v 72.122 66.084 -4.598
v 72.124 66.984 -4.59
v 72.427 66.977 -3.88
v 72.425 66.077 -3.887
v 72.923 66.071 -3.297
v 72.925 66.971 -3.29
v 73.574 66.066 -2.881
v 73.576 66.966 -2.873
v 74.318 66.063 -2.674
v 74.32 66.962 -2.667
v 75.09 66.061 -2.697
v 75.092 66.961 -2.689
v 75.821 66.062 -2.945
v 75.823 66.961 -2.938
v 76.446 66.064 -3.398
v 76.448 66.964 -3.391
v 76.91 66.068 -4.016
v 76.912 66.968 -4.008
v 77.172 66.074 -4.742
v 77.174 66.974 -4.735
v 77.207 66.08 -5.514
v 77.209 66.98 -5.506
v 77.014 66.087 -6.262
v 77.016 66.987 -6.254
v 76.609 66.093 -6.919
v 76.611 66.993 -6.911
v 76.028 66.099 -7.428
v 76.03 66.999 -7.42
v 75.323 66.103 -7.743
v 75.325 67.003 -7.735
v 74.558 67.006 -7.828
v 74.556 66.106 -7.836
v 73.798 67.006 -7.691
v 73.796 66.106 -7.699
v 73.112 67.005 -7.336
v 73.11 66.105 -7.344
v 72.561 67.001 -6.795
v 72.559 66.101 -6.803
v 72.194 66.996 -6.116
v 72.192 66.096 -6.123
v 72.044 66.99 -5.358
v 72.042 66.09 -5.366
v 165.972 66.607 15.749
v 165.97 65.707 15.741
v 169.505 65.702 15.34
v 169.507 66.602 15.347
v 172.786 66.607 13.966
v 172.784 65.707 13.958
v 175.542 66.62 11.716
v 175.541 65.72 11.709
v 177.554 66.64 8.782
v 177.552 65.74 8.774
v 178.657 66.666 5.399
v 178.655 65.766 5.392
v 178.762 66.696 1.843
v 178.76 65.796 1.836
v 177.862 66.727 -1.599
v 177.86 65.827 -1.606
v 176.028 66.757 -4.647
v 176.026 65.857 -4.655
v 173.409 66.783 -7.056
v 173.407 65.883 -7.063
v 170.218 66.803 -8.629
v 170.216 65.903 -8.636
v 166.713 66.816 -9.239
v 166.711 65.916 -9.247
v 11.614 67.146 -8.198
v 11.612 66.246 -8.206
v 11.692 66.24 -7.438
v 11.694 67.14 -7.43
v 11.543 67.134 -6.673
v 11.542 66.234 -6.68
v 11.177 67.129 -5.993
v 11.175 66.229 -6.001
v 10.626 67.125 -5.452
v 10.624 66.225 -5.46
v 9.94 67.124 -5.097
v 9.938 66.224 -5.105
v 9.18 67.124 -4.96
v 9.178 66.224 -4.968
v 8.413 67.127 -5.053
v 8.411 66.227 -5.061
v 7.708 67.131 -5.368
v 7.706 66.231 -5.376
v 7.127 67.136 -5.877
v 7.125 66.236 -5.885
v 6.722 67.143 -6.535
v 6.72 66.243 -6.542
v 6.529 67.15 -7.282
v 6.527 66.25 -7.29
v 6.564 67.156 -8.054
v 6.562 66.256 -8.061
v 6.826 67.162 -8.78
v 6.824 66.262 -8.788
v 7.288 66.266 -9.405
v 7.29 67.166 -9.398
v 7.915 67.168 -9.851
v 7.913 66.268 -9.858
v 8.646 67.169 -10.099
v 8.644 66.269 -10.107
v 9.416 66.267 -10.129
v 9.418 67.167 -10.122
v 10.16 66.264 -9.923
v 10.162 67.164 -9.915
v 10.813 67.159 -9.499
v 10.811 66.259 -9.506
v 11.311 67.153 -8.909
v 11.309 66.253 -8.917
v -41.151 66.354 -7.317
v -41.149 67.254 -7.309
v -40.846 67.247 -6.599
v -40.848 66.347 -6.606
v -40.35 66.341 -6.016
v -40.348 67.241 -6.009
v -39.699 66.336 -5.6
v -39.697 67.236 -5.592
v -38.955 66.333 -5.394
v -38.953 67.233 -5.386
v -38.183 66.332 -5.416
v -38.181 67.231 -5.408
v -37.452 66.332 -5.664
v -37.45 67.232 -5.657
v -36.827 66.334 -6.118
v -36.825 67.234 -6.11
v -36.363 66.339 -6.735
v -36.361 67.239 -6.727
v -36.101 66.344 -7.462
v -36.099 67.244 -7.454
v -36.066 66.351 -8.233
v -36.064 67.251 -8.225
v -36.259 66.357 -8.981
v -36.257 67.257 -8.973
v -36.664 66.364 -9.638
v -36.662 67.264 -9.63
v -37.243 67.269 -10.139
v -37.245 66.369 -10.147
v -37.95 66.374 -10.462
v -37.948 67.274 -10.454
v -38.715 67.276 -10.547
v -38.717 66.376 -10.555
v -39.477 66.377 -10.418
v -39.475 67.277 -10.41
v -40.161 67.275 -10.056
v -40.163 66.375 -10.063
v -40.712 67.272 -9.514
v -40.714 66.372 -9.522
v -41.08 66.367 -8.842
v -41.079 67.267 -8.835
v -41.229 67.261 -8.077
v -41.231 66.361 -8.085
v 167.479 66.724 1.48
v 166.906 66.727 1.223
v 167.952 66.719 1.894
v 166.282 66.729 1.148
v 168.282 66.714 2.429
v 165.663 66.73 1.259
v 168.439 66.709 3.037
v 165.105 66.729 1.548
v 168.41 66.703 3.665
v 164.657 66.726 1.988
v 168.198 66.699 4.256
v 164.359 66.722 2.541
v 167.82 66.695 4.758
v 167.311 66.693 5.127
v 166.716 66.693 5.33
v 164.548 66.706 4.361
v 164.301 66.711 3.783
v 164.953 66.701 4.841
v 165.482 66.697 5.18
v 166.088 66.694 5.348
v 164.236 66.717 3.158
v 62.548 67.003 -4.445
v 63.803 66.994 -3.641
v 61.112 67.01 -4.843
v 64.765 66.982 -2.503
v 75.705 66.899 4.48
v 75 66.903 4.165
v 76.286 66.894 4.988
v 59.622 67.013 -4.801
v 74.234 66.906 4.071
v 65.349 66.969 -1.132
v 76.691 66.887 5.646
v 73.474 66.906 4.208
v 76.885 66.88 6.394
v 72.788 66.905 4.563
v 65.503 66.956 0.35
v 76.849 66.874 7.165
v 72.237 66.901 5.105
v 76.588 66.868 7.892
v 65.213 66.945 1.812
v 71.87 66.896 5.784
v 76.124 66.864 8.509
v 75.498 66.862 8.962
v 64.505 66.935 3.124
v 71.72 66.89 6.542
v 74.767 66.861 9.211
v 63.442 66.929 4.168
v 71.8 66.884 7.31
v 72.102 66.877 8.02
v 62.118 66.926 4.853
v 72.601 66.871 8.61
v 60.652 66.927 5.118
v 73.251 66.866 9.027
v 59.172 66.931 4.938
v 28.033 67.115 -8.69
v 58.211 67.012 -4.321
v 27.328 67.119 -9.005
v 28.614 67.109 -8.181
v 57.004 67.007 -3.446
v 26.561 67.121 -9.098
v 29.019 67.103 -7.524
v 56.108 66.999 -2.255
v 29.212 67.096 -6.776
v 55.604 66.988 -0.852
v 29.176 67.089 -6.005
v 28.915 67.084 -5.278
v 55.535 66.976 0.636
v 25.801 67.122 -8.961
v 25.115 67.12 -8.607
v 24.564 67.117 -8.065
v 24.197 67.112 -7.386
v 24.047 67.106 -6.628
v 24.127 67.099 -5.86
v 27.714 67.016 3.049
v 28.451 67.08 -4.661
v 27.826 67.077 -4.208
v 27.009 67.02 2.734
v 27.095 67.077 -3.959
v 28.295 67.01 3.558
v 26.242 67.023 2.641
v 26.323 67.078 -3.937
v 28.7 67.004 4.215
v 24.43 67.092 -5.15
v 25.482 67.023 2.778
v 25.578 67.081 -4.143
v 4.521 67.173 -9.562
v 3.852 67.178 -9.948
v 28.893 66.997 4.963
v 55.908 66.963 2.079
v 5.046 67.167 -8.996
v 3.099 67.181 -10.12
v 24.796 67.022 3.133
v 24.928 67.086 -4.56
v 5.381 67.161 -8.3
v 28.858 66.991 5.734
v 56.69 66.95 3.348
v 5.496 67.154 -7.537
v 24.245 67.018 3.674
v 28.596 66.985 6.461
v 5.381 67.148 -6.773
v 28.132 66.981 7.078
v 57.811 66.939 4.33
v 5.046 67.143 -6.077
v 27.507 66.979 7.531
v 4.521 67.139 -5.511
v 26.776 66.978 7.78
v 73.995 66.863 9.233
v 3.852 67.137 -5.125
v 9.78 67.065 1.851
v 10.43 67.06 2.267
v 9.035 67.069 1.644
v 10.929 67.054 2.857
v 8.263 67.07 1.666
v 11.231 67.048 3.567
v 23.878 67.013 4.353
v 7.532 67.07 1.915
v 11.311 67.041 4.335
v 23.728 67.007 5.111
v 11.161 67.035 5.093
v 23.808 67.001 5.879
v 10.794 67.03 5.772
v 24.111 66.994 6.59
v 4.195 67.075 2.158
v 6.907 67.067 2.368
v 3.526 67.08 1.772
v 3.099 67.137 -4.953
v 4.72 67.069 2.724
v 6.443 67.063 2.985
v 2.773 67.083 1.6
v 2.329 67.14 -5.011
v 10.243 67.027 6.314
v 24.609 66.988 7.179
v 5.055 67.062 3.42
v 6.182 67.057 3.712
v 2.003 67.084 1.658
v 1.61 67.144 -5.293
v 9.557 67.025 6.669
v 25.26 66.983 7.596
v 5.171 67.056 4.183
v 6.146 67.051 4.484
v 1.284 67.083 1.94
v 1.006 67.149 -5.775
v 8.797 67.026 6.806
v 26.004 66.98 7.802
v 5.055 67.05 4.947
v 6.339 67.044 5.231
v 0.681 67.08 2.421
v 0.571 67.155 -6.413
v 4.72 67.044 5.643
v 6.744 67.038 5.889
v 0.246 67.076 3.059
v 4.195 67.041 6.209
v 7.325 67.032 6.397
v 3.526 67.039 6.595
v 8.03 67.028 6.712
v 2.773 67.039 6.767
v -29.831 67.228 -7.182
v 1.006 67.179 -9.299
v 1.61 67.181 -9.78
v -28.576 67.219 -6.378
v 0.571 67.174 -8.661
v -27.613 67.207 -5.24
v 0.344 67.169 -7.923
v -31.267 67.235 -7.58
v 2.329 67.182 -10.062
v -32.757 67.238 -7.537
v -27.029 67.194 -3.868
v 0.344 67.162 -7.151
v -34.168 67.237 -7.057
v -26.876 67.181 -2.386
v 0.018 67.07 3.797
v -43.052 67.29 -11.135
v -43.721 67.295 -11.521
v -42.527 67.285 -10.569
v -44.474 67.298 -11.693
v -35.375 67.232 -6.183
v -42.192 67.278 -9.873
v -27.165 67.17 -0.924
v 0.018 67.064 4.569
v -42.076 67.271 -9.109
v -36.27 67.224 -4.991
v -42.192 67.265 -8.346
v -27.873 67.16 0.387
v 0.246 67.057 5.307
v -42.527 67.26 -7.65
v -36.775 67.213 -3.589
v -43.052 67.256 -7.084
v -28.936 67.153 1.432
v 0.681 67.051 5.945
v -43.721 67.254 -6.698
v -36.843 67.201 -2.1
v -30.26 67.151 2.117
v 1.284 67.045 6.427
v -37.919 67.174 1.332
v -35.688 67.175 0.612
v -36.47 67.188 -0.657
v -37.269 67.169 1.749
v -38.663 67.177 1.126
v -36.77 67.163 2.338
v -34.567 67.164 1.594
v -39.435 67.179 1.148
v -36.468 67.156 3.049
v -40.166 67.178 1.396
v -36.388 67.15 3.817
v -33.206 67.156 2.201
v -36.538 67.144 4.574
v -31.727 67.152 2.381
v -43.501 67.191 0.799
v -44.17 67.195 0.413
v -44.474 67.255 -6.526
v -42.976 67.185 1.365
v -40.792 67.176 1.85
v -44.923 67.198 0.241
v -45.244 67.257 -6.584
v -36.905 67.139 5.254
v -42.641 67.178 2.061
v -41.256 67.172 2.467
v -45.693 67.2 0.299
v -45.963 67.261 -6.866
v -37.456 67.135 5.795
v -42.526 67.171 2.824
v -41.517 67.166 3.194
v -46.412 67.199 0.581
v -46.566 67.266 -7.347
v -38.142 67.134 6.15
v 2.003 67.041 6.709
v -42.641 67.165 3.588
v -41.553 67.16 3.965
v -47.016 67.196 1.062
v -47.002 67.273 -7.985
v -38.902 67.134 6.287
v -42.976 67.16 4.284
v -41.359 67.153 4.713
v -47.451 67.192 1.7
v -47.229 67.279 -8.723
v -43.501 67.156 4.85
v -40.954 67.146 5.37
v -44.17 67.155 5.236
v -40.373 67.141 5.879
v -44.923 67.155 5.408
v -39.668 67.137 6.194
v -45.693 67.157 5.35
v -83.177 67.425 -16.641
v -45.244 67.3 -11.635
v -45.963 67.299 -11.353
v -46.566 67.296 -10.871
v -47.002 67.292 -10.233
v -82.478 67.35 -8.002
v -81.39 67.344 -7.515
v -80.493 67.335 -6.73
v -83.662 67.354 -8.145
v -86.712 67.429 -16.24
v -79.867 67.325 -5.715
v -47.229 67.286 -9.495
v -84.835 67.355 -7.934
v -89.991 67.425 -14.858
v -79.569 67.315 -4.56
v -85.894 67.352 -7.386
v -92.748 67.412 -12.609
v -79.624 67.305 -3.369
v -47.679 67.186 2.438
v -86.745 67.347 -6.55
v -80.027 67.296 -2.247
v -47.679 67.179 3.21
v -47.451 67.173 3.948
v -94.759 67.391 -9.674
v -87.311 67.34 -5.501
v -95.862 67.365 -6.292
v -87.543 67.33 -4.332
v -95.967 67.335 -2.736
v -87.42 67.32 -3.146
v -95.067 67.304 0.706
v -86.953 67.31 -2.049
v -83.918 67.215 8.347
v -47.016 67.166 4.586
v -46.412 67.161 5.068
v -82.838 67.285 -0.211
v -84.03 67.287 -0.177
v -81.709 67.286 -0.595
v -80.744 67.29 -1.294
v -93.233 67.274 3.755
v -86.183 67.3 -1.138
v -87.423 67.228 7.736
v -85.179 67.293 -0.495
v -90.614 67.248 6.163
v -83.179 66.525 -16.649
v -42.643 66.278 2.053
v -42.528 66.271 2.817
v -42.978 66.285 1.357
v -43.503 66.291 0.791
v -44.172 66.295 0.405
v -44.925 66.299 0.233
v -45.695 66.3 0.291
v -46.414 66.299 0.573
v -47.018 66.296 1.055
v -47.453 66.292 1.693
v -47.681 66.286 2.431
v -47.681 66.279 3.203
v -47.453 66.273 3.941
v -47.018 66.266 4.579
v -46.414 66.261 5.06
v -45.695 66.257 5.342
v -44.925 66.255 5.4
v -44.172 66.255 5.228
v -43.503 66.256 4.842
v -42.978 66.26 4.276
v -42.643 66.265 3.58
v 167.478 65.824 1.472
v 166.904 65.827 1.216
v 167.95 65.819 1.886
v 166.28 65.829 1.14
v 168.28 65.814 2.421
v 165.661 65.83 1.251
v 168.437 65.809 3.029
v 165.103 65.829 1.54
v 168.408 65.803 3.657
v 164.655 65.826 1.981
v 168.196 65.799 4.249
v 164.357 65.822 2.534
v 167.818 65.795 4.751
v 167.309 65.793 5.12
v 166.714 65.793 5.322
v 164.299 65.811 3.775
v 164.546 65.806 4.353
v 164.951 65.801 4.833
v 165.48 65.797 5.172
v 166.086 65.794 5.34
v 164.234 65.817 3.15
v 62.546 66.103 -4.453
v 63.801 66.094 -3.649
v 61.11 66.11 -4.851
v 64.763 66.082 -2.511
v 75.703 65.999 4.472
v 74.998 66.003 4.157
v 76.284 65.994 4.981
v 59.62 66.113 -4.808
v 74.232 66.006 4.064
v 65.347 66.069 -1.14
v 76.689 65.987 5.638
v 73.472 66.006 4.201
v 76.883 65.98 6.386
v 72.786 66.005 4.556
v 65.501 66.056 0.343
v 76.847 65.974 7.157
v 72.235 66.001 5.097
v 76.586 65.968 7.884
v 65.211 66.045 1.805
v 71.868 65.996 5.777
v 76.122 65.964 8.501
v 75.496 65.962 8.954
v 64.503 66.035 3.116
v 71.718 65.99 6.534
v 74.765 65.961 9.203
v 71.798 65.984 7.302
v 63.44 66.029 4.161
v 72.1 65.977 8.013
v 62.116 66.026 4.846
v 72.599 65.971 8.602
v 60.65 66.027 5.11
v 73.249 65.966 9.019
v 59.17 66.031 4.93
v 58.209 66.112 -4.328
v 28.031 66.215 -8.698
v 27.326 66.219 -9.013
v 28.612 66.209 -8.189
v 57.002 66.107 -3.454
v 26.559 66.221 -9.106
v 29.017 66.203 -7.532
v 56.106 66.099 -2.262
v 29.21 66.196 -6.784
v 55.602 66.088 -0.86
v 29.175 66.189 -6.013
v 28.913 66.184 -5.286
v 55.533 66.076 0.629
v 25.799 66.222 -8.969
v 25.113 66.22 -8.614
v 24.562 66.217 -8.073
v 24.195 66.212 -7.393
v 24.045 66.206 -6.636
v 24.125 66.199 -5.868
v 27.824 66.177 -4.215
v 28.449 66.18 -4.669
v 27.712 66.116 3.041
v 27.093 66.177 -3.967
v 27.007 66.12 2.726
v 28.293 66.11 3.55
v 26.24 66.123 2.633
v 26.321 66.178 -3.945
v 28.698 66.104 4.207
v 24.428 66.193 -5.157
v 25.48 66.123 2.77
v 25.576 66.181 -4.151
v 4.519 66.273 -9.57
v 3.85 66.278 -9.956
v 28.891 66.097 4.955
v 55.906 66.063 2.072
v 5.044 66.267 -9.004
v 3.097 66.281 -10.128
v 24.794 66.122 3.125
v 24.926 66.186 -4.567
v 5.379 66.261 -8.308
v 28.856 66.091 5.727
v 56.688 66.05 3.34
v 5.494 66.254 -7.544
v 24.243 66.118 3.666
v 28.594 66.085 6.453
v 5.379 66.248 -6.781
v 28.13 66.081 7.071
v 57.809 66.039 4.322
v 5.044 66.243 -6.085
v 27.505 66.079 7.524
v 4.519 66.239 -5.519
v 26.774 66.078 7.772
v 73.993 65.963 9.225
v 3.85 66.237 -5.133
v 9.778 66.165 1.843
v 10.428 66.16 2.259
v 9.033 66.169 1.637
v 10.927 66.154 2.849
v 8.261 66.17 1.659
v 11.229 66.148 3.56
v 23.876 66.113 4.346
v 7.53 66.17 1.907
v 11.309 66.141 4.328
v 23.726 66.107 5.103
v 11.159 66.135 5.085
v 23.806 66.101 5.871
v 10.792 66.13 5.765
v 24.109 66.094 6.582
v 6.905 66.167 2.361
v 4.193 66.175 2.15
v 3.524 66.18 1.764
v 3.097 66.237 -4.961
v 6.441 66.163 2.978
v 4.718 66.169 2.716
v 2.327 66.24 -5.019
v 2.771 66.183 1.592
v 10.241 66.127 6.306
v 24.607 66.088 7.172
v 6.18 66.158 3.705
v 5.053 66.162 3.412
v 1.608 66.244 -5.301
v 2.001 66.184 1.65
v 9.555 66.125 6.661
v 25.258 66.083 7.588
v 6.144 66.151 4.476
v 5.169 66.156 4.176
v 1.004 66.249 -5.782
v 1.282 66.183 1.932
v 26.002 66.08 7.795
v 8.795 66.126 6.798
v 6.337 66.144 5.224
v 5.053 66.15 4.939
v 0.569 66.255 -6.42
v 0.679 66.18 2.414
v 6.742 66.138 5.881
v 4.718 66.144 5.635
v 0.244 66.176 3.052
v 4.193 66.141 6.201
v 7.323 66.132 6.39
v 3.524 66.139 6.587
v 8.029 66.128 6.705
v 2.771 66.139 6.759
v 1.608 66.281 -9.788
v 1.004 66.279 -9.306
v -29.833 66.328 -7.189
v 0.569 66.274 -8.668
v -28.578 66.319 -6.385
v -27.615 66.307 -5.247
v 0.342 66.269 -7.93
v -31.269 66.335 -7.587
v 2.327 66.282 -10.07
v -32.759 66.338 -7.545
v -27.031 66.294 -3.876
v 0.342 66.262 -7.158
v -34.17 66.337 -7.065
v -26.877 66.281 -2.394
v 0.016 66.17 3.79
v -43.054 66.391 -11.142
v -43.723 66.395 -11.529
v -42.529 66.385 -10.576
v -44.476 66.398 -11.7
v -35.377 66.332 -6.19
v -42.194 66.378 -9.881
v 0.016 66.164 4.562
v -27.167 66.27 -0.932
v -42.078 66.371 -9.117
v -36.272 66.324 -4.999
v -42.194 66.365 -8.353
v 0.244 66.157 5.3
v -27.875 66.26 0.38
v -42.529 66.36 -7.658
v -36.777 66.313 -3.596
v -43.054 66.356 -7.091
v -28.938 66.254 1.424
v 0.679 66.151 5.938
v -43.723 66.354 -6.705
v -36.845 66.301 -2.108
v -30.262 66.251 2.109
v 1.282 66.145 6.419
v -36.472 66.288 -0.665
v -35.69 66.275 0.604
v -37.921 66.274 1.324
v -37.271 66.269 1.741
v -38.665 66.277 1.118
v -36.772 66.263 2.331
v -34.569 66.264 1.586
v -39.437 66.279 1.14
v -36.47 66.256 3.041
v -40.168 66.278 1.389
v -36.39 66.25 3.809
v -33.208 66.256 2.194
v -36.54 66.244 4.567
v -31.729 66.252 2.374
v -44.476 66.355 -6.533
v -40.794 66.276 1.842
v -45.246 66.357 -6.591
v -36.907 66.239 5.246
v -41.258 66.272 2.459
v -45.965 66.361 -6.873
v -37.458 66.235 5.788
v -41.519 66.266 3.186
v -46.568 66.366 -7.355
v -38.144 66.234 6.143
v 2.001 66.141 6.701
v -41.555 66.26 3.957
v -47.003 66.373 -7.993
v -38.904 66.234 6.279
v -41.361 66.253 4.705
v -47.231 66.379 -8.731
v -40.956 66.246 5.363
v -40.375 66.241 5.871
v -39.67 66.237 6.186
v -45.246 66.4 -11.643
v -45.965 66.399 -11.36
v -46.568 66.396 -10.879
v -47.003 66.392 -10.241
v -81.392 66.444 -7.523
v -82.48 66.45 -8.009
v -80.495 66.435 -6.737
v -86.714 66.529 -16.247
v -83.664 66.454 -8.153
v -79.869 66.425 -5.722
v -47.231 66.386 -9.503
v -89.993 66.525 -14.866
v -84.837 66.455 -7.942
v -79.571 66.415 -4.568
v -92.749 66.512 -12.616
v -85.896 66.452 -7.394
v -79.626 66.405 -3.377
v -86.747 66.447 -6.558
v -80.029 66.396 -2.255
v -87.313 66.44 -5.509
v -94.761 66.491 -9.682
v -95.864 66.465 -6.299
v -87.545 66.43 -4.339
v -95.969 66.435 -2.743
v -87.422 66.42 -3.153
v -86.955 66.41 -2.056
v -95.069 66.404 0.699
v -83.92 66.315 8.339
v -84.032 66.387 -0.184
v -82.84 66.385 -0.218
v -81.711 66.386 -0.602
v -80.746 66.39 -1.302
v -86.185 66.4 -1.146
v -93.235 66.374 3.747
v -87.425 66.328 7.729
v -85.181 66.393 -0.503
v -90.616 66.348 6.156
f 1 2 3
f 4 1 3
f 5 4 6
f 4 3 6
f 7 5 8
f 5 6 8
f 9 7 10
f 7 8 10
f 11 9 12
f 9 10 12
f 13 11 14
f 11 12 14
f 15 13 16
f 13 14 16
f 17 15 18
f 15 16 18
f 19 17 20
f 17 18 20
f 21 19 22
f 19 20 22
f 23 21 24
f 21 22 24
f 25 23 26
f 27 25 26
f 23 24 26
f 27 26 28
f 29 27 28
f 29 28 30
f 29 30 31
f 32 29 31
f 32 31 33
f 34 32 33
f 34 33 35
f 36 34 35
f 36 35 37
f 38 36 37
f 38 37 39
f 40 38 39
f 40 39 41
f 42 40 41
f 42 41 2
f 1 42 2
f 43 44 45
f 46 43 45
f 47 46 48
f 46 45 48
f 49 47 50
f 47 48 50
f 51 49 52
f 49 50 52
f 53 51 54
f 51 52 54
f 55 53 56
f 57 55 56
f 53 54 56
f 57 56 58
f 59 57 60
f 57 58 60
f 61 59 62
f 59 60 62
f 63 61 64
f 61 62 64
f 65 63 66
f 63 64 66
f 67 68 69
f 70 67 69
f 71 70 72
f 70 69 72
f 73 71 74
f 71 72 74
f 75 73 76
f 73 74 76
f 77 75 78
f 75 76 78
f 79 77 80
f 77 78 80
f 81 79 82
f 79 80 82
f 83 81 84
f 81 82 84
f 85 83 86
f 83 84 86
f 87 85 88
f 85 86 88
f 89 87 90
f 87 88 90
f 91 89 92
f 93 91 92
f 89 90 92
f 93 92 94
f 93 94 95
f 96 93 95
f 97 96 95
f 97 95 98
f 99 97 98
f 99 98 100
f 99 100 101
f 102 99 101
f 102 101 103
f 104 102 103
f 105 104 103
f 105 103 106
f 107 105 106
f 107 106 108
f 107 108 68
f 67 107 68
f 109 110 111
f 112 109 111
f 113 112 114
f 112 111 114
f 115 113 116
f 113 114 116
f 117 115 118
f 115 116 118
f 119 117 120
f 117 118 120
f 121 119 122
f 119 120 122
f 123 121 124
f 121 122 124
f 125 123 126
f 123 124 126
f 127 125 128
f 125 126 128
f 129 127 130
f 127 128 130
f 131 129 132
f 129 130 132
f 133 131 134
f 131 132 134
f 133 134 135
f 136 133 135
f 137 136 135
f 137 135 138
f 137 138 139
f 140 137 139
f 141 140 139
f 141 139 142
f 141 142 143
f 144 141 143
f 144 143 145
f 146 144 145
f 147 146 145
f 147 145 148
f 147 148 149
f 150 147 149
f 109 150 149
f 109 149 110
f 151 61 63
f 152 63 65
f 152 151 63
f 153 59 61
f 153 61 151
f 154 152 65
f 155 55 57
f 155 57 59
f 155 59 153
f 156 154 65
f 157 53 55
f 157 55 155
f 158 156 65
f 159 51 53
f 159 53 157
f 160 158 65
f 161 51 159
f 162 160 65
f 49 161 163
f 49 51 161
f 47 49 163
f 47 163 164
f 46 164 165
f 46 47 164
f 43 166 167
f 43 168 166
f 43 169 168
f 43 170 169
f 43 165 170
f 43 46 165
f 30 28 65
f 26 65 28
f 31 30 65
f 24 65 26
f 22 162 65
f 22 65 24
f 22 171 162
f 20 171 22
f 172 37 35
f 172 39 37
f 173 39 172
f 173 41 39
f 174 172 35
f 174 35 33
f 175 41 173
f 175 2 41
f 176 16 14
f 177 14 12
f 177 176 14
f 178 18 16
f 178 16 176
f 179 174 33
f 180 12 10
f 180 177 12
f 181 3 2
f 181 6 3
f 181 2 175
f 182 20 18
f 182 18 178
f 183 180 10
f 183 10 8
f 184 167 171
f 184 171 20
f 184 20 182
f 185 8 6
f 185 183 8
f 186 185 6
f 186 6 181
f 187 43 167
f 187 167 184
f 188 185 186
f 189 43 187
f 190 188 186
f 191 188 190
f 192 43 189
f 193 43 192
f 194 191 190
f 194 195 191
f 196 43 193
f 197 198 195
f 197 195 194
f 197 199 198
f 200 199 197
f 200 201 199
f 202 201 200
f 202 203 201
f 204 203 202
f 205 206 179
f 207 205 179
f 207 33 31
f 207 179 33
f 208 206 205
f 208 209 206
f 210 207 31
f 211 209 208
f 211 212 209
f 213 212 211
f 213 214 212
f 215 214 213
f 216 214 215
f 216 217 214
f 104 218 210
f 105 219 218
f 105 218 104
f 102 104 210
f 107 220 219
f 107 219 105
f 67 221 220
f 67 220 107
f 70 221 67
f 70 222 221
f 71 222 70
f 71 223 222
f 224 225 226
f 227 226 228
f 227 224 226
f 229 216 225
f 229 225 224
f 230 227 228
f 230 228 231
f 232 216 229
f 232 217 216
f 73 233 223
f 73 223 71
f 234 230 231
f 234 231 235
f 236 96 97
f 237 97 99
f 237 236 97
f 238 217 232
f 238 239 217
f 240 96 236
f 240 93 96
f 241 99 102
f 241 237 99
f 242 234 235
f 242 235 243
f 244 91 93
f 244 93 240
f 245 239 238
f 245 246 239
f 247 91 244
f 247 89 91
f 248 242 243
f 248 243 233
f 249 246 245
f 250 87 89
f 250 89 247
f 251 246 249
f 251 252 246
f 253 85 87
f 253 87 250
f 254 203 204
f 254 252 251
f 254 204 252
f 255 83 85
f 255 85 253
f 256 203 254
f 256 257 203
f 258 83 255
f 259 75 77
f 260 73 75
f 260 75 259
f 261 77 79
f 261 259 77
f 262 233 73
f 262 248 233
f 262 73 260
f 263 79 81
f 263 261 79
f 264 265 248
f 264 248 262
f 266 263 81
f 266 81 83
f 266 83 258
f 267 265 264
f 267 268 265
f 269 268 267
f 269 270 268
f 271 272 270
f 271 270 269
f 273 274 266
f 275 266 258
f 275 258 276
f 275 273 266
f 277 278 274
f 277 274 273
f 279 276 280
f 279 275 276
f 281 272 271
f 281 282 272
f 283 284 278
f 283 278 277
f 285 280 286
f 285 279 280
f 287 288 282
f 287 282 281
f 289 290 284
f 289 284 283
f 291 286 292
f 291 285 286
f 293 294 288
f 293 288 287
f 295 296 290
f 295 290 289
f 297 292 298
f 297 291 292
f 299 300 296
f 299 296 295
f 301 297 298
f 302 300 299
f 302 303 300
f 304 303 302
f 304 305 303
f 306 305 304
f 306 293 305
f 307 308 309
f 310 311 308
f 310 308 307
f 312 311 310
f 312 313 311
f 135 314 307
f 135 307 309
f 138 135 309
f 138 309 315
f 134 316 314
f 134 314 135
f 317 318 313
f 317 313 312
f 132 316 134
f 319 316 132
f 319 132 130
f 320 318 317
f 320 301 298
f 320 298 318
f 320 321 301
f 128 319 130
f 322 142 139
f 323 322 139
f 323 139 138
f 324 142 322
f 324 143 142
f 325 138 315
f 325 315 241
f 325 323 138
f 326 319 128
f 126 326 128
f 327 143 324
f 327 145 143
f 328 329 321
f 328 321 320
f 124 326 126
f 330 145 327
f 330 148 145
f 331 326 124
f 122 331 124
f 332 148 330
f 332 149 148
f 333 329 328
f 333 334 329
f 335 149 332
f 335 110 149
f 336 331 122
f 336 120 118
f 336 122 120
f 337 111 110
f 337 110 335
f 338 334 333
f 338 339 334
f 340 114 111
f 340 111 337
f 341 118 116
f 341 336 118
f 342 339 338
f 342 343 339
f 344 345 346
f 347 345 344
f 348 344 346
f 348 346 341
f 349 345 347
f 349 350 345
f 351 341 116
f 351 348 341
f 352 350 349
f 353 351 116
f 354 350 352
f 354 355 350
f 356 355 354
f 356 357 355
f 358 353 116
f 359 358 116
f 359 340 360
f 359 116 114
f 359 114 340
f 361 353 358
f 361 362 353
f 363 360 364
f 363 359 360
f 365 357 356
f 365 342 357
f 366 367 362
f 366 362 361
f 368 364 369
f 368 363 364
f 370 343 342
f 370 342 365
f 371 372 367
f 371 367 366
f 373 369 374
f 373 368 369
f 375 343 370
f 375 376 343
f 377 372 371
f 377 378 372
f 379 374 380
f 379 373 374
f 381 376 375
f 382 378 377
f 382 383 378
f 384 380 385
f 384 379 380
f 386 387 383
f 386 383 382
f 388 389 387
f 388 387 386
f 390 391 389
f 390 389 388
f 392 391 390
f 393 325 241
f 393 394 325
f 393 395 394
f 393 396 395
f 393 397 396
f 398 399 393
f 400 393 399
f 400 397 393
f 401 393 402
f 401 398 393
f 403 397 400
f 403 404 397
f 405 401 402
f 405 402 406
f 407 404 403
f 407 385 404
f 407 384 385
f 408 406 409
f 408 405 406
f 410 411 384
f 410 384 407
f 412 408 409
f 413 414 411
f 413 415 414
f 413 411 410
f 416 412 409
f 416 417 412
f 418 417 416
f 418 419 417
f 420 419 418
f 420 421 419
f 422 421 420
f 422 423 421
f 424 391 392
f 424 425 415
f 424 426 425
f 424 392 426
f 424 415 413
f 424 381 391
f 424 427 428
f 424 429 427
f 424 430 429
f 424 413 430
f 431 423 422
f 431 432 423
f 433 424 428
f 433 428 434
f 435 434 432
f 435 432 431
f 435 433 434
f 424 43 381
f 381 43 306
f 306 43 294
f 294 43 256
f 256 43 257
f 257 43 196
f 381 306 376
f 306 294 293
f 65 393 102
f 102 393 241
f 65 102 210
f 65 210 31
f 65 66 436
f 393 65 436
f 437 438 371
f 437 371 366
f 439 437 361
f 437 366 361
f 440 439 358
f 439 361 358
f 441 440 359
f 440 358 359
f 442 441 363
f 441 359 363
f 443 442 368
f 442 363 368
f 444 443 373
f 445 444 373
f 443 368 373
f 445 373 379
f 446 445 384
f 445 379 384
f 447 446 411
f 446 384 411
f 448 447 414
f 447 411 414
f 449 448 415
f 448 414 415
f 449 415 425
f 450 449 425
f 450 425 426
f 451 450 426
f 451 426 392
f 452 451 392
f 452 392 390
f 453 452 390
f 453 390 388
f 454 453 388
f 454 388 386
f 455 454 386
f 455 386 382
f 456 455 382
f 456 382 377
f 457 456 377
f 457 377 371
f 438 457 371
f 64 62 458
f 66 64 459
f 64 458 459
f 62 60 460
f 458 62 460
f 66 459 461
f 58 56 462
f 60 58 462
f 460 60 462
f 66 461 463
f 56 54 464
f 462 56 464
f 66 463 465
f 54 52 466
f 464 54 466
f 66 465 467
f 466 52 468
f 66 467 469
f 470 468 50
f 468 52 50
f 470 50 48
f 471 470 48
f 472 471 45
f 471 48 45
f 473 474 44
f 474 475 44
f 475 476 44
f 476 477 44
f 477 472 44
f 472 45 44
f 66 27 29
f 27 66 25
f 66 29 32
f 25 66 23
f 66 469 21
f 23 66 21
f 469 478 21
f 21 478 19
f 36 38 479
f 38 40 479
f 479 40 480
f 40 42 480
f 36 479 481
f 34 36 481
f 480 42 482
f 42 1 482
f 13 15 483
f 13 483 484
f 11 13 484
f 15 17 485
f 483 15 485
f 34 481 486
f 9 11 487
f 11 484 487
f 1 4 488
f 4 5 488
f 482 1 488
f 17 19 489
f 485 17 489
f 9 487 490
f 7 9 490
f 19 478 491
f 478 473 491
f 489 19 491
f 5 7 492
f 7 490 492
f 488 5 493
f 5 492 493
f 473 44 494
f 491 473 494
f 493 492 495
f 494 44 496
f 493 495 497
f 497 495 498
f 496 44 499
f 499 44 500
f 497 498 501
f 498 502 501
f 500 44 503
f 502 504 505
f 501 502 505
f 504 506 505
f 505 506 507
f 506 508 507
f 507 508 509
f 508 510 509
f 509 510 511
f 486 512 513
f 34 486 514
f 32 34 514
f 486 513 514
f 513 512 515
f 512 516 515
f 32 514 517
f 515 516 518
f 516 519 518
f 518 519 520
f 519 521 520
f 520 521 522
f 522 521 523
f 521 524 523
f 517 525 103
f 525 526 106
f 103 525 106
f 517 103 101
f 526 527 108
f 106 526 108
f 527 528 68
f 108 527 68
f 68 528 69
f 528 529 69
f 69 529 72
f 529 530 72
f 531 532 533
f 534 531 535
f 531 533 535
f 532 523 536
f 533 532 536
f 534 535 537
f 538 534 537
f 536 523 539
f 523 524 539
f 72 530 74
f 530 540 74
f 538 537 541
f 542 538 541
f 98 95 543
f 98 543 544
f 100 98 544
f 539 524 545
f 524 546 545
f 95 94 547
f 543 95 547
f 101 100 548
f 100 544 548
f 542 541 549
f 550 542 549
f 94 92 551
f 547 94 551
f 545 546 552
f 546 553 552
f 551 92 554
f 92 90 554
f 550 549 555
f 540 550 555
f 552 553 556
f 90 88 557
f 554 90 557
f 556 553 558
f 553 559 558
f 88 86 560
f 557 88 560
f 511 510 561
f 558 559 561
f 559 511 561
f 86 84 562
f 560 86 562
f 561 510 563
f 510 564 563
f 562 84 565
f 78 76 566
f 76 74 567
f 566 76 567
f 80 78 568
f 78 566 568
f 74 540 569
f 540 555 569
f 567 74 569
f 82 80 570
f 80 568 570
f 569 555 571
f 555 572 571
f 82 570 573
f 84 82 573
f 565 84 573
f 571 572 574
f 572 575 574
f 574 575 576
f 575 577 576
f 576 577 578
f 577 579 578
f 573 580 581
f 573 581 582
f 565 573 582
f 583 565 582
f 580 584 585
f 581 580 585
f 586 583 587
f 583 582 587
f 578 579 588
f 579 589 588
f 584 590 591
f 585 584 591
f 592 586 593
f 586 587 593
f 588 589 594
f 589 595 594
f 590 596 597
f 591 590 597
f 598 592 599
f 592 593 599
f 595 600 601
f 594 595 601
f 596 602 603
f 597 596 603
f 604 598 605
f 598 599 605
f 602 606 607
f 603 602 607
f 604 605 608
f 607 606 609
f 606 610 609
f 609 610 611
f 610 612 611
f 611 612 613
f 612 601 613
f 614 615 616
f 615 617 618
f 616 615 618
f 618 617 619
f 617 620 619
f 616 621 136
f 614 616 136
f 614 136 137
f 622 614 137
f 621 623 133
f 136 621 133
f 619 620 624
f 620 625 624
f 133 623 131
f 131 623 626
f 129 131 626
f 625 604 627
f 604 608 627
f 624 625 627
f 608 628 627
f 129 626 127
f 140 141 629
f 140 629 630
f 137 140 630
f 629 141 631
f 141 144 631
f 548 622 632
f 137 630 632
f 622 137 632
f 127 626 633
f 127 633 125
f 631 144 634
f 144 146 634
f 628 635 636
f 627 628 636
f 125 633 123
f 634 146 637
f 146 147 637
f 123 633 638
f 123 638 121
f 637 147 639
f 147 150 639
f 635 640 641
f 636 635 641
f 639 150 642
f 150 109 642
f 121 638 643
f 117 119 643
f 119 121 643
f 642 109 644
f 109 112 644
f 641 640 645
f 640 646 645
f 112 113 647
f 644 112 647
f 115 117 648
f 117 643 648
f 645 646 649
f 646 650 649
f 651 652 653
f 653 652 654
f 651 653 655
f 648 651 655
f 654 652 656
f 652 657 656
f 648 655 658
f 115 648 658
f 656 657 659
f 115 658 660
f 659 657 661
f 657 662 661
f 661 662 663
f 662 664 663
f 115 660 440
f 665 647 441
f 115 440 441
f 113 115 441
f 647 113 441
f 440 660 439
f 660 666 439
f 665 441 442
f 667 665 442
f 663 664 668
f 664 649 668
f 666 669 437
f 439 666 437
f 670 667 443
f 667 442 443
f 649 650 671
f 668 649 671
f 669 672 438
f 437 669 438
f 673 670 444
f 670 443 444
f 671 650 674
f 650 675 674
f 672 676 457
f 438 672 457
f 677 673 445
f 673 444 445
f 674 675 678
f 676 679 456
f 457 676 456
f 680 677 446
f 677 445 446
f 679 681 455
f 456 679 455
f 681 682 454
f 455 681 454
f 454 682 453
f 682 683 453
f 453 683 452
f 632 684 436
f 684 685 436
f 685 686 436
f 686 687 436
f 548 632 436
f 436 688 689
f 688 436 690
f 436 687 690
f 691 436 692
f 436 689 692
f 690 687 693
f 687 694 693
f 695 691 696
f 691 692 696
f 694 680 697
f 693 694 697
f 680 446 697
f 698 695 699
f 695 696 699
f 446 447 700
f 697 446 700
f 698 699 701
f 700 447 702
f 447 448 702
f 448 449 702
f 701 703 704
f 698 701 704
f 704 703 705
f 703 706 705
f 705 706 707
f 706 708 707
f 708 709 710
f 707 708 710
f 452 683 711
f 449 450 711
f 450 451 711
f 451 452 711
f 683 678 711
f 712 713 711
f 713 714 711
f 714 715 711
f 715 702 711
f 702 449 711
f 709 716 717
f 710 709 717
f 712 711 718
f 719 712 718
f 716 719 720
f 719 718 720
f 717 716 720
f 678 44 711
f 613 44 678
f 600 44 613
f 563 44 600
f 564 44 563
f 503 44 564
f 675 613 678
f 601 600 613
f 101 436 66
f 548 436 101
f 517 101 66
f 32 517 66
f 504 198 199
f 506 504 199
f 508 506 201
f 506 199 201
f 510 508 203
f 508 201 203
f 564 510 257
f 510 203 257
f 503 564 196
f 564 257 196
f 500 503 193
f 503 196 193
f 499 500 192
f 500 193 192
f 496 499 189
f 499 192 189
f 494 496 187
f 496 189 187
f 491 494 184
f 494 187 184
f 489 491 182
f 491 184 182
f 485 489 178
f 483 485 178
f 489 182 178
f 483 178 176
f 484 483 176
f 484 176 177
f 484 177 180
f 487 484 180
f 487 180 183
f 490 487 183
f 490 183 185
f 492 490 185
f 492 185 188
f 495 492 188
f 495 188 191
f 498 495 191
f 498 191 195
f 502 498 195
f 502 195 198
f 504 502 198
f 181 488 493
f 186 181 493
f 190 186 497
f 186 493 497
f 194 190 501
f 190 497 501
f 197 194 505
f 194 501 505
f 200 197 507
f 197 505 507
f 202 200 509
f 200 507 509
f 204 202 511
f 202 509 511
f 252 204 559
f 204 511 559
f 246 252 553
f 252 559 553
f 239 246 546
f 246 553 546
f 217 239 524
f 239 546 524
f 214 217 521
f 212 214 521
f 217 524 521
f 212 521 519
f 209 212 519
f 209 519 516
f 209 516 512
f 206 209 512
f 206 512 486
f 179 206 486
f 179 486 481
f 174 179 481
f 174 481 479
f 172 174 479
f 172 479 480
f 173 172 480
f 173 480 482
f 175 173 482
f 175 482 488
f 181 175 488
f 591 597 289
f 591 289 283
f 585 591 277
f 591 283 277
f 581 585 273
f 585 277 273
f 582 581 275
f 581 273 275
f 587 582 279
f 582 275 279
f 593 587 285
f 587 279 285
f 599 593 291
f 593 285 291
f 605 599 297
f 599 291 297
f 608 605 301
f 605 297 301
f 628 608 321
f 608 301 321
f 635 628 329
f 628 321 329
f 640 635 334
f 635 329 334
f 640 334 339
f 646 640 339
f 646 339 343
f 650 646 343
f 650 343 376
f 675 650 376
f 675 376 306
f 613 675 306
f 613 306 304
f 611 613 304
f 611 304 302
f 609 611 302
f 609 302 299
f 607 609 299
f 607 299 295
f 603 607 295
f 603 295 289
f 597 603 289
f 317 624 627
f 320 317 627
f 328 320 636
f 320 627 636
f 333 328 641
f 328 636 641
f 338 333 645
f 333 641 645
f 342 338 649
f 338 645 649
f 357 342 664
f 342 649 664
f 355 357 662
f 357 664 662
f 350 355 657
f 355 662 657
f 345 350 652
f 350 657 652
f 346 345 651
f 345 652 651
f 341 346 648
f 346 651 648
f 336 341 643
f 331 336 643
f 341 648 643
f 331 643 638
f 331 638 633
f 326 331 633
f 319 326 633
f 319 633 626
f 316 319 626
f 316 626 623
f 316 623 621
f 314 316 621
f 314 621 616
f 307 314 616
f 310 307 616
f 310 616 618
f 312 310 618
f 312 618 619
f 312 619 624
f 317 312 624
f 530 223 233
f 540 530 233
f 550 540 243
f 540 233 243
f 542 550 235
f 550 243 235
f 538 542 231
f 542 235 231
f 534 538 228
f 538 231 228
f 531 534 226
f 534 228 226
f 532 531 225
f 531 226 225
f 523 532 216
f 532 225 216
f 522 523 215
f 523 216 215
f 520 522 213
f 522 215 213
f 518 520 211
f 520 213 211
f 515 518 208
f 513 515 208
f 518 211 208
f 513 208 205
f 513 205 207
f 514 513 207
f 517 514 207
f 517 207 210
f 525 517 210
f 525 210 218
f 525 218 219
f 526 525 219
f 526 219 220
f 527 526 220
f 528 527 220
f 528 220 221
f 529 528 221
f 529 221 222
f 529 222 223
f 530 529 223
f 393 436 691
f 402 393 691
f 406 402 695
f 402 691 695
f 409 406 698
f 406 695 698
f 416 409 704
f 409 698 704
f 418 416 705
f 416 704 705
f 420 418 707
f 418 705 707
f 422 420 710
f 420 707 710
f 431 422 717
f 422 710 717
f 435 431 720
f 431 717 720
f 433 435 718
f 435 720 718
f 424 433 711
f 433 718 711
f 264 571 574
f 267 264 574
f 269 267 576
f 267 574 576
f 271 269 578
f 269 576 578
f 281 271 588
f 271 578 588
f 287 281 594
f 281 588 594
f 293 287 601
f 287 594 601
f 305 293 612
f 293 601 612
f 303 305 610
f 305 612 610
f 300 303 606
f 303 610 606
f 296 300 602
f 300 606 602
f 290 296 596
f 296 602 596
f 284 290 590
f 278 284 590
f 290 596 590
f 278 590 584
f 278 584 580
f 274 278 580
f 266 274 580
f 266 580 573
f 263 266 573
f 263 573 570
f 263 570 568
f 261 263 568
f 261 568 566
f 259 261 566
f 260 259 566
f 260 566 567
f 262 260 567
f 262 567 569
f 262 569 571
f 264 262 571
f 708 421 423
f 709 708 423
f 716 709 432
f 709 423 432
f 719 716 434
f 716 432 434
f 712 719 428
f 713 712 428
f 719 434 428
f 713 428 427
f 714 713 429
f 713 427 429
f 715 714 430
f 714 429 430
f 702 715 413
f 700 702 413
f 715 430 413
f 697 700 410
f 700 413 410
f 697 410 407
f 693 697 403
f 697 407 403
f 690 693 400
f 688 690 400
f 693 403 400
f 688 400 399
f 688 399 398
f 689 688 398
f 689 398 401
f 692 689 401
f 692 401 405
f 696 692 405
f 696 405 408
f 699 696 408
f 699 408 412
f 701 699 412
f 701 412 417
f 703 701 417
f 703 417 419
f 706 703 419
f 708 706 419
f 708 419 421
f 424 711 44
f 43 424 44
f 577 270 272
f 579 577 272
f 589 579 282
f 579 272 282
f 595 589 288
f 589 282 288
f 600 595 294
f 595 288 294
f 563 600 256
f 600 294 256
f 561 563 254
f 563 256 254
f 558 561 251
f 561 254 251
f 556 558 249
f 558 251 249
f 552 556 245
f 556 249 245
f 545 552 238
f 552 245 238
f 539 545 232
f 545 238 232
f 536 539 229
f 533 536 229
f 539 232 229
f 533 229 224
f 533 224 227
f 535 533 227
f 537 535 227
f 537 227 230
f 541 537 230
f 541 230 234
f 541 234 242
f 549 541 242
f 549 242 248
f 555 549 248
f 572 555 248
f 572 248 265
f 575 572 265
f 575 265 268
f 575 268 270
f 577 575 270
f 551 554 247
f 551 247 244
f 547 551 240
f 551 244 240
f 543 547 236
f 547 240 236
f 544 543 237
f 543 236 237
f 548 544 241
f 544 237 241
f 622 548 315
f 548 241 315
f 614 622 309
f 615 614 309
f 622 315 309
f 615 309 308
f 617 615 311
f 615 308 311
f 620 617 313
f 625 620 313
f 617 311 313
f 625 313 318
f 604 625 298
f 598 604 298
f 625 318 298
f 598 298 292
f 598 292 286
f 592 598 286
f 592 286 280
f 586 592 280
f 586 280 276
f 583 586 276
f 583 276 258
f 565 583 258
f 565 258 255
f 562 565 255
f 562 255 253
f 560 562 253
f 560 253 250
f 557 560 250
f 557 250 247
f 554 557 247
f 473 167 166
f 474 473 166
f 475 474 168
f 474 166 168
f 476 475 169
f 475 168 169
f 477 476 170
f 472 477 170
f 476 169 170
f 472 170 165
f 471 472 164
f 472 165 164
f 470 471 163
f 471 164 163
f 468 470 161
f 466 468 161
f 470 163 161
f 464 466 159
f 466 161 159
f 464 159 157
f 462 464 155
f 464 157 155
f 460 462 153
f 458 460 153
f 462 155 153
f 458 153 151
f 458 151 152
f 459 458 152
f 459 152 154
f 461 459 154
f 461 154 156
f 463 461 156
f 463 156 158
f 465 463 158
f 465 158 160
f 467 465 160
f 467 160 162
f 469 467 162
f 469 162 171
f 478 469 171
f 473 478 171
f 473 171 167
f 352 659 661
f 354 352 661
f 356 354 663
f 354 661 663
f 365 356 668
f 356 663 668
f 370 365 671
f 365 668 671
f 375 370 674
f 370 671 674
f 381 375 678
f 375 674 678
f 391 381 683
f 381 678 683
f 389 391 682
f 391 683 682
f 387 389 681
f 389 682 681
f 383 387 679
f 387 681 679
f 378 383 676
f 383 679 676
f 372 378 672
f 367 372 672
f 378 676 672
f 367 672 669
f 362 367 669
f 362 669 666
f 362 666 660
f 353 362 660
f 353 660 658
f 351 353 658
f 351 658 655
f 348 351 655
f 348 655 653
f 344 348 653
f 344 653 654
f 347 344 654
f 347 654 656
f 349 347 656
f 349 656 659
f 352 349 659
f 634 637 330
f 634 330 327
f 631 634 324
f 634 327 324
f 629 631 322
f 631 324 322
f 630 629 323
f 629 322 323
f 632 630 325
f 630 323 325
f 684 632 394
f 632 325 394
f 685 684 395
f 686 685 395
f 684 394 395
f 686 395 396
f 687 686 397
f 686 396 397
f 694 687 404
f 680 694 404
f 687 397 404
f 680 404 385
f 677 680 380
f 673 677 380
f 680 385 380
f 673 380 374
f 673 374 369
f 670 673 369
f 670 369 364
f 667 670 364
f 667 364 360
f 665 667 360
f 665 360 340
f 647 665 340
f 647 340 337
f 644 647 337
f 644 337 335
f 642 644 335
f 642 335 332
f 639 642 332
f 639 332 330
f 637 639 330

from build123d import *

# Parameters (mm, degrees)
BASE_FLANGE1_DEPTH          = 0.9
SKETCH7_R                   = 1.75
CUT_EXTRUDE1_DEPTH          = 10
F_6_0_204_DIAMETER_SLOT1_D  = 5.1816
F_1_0MM_DOWEL_SLOT1_D       = 8
F_19_0_166_DIAMETER_SLOT2_D = 4.2164
F_10_0MM_DOWEL_SLOT1_D      = 10
F_6_0_204_DIAMETER_SLOT7_D  = 5.1816
F_6_0_204_DIAMETER_SLOT9_D  = 5.1816
F_6_0_204_DIAMETER_SLOT10_D = 5.1816
BODY_MOVE_COPY1_ANGLE       = 90
BODY_MOVE_COPY2_ANGLE       = 14.508572097
F_6_0_204_DIAMETER_SLOT11_D = 5.1816


# Sheet-metal steps are written as plain solids
with BuildPart() as part:
    # Sketch1 → Base-Flange1 (new body)
    with BuildSketch(Plane.XY):
        with BuildLine():
            Line((-82.128696711, 43.701330638), (157.948038639, 113.437699511))
            ThreePointArc((157.948038639, 113.437699511), (173.43869385, 104.920681188), (164.921675527, 89.430025976))
            Line((164.921675527, 89.430025976), (-75.155059823, 19.693657103))
            ThreePointArc((-75.155059823, 19.693657103), (-90.645715035, 28.210675427), (-82.128696711, 43.701330638))
        make_face()
    extrude(amount=-BASE_FLANGE1_DEPTH)

    # Sketch7 → Cut-Extrude1 (cut)
    with BuildSketch(Plane.XY):
        with Locations((-78.641878267, 31.69749387)):
            Circle(SKETCH7_R)
    extrude(amount=-CUT_EXTRUDE1_DEPTH, mode=Mode.SUBTRACT)

    # #6 (0.204) Diameter Slot1 (through all)
    with Locations(Plane.XY):
        with Locations((-34.211526563, 39.252388593)):
            Hole(F_6_0_204_DIAMETER_SLOT1_D / 2)

    # Ø1.0mm Dowel Slot1 (through all)
    with Locations(Plane.XY):
        with Locations((-78.641878267, 31.69749387)):
            Hole(F_1_0MM_DOWEL_SLOT1_D / 2)

    # #19 (0.166) Diameter Slot2 (through all)
    with Locations(Plane.XY):
        with Locations((161.434857083, 101.433862744)):
            Hole(F_19_0_166_DIAMETER_SLOT2_D / 2)

    # Ø10.0mm Dowel Slot1 (through all)
    with Locations(Plane(origin=(0, 0, -0.9), x_dir=(-1, 0, 0), z_dir=(0, 0, -1))):
        with Locations((28.994009397, 46.118974953), (-59.756909092, 71.89892727)):
            Hole(F_10_0MM_DOWEL_SLOT1_D / 2)

    # #6 (0.204) Diameter Slot7 (through all)
    with Locations(Plane(origin=(0, 0, -0.9), x_dir=(-1, 0, 0), z_dir=(0, 0, -1))):
        with Locations((37.45422118, 50.452838291)):
            Hole(F_6_0_204_DIAMETER_SLOT7_D / 2)

    # #6 (0.204) Diameter Slot9 (through all)
    with Locations(Plane.XY):
        with Locations((28.62233158, 56.99969603), (25.374397473, 68.28544764), (74.772604857, 70.247325472), (71.479014493, 81.687286544)):
            Hole(F_6_0_204_DIAMETER_SLOT9_D / 2)

    # #6 (0.204) Diameter Slot10 (through all)
    with Locations(Plane(origin=(0, 0, -0.9), x_dir=(-1, 0, 0), z_dir=(0, 0, -1))):
        with Locations((-8.595334372, 62.898097763), (-11.911821865, 51.602538742)):
            Hole(F_6_0_204_DIAMETER_SLOT10_D / 2)


with BuildPart() as part_1:
    # Body-Move/Copy1: moved
    add(part.part.rotate(Axis((0, 66.565678307, -0.45), (1, 0, 0)), BODY_MOVE_COPY1_ANGLE))


with BuildPart() as part_2:
    # Body-Move/Copy2: moved
    add(part_1.part.moved(Location((0, 0, 0))).rotate(Axis((39.067388507, -1.340632846, -0.153700941), (0.03427825712896061, 0.9994028141797792, -0.004360745089880855)), BODY_MOVE_COPY2_ANGLE))

    # #6 (0.204) Diameter Slot11 (through all)
    with Locations(Plane(origin=(0.144643233, 66.197270405, 0.559293884), x_dir=(-0.9999976129939137, 0.0021848720127792104, 1.845975741503872e-05), z_dir=(-0.002184949993677132, -0.999961923064164, -0.00844857475223902))):
        with Locations((-2.433159338, -3.616580433), (-2.759003314, 8.103849751), (45.263549296, -2.25659234), (44.813996852, 9.677370774)):
            Hole(F_6_0_204_DIAMETER_SLOT11_D / 2)


solid = part_2.part
